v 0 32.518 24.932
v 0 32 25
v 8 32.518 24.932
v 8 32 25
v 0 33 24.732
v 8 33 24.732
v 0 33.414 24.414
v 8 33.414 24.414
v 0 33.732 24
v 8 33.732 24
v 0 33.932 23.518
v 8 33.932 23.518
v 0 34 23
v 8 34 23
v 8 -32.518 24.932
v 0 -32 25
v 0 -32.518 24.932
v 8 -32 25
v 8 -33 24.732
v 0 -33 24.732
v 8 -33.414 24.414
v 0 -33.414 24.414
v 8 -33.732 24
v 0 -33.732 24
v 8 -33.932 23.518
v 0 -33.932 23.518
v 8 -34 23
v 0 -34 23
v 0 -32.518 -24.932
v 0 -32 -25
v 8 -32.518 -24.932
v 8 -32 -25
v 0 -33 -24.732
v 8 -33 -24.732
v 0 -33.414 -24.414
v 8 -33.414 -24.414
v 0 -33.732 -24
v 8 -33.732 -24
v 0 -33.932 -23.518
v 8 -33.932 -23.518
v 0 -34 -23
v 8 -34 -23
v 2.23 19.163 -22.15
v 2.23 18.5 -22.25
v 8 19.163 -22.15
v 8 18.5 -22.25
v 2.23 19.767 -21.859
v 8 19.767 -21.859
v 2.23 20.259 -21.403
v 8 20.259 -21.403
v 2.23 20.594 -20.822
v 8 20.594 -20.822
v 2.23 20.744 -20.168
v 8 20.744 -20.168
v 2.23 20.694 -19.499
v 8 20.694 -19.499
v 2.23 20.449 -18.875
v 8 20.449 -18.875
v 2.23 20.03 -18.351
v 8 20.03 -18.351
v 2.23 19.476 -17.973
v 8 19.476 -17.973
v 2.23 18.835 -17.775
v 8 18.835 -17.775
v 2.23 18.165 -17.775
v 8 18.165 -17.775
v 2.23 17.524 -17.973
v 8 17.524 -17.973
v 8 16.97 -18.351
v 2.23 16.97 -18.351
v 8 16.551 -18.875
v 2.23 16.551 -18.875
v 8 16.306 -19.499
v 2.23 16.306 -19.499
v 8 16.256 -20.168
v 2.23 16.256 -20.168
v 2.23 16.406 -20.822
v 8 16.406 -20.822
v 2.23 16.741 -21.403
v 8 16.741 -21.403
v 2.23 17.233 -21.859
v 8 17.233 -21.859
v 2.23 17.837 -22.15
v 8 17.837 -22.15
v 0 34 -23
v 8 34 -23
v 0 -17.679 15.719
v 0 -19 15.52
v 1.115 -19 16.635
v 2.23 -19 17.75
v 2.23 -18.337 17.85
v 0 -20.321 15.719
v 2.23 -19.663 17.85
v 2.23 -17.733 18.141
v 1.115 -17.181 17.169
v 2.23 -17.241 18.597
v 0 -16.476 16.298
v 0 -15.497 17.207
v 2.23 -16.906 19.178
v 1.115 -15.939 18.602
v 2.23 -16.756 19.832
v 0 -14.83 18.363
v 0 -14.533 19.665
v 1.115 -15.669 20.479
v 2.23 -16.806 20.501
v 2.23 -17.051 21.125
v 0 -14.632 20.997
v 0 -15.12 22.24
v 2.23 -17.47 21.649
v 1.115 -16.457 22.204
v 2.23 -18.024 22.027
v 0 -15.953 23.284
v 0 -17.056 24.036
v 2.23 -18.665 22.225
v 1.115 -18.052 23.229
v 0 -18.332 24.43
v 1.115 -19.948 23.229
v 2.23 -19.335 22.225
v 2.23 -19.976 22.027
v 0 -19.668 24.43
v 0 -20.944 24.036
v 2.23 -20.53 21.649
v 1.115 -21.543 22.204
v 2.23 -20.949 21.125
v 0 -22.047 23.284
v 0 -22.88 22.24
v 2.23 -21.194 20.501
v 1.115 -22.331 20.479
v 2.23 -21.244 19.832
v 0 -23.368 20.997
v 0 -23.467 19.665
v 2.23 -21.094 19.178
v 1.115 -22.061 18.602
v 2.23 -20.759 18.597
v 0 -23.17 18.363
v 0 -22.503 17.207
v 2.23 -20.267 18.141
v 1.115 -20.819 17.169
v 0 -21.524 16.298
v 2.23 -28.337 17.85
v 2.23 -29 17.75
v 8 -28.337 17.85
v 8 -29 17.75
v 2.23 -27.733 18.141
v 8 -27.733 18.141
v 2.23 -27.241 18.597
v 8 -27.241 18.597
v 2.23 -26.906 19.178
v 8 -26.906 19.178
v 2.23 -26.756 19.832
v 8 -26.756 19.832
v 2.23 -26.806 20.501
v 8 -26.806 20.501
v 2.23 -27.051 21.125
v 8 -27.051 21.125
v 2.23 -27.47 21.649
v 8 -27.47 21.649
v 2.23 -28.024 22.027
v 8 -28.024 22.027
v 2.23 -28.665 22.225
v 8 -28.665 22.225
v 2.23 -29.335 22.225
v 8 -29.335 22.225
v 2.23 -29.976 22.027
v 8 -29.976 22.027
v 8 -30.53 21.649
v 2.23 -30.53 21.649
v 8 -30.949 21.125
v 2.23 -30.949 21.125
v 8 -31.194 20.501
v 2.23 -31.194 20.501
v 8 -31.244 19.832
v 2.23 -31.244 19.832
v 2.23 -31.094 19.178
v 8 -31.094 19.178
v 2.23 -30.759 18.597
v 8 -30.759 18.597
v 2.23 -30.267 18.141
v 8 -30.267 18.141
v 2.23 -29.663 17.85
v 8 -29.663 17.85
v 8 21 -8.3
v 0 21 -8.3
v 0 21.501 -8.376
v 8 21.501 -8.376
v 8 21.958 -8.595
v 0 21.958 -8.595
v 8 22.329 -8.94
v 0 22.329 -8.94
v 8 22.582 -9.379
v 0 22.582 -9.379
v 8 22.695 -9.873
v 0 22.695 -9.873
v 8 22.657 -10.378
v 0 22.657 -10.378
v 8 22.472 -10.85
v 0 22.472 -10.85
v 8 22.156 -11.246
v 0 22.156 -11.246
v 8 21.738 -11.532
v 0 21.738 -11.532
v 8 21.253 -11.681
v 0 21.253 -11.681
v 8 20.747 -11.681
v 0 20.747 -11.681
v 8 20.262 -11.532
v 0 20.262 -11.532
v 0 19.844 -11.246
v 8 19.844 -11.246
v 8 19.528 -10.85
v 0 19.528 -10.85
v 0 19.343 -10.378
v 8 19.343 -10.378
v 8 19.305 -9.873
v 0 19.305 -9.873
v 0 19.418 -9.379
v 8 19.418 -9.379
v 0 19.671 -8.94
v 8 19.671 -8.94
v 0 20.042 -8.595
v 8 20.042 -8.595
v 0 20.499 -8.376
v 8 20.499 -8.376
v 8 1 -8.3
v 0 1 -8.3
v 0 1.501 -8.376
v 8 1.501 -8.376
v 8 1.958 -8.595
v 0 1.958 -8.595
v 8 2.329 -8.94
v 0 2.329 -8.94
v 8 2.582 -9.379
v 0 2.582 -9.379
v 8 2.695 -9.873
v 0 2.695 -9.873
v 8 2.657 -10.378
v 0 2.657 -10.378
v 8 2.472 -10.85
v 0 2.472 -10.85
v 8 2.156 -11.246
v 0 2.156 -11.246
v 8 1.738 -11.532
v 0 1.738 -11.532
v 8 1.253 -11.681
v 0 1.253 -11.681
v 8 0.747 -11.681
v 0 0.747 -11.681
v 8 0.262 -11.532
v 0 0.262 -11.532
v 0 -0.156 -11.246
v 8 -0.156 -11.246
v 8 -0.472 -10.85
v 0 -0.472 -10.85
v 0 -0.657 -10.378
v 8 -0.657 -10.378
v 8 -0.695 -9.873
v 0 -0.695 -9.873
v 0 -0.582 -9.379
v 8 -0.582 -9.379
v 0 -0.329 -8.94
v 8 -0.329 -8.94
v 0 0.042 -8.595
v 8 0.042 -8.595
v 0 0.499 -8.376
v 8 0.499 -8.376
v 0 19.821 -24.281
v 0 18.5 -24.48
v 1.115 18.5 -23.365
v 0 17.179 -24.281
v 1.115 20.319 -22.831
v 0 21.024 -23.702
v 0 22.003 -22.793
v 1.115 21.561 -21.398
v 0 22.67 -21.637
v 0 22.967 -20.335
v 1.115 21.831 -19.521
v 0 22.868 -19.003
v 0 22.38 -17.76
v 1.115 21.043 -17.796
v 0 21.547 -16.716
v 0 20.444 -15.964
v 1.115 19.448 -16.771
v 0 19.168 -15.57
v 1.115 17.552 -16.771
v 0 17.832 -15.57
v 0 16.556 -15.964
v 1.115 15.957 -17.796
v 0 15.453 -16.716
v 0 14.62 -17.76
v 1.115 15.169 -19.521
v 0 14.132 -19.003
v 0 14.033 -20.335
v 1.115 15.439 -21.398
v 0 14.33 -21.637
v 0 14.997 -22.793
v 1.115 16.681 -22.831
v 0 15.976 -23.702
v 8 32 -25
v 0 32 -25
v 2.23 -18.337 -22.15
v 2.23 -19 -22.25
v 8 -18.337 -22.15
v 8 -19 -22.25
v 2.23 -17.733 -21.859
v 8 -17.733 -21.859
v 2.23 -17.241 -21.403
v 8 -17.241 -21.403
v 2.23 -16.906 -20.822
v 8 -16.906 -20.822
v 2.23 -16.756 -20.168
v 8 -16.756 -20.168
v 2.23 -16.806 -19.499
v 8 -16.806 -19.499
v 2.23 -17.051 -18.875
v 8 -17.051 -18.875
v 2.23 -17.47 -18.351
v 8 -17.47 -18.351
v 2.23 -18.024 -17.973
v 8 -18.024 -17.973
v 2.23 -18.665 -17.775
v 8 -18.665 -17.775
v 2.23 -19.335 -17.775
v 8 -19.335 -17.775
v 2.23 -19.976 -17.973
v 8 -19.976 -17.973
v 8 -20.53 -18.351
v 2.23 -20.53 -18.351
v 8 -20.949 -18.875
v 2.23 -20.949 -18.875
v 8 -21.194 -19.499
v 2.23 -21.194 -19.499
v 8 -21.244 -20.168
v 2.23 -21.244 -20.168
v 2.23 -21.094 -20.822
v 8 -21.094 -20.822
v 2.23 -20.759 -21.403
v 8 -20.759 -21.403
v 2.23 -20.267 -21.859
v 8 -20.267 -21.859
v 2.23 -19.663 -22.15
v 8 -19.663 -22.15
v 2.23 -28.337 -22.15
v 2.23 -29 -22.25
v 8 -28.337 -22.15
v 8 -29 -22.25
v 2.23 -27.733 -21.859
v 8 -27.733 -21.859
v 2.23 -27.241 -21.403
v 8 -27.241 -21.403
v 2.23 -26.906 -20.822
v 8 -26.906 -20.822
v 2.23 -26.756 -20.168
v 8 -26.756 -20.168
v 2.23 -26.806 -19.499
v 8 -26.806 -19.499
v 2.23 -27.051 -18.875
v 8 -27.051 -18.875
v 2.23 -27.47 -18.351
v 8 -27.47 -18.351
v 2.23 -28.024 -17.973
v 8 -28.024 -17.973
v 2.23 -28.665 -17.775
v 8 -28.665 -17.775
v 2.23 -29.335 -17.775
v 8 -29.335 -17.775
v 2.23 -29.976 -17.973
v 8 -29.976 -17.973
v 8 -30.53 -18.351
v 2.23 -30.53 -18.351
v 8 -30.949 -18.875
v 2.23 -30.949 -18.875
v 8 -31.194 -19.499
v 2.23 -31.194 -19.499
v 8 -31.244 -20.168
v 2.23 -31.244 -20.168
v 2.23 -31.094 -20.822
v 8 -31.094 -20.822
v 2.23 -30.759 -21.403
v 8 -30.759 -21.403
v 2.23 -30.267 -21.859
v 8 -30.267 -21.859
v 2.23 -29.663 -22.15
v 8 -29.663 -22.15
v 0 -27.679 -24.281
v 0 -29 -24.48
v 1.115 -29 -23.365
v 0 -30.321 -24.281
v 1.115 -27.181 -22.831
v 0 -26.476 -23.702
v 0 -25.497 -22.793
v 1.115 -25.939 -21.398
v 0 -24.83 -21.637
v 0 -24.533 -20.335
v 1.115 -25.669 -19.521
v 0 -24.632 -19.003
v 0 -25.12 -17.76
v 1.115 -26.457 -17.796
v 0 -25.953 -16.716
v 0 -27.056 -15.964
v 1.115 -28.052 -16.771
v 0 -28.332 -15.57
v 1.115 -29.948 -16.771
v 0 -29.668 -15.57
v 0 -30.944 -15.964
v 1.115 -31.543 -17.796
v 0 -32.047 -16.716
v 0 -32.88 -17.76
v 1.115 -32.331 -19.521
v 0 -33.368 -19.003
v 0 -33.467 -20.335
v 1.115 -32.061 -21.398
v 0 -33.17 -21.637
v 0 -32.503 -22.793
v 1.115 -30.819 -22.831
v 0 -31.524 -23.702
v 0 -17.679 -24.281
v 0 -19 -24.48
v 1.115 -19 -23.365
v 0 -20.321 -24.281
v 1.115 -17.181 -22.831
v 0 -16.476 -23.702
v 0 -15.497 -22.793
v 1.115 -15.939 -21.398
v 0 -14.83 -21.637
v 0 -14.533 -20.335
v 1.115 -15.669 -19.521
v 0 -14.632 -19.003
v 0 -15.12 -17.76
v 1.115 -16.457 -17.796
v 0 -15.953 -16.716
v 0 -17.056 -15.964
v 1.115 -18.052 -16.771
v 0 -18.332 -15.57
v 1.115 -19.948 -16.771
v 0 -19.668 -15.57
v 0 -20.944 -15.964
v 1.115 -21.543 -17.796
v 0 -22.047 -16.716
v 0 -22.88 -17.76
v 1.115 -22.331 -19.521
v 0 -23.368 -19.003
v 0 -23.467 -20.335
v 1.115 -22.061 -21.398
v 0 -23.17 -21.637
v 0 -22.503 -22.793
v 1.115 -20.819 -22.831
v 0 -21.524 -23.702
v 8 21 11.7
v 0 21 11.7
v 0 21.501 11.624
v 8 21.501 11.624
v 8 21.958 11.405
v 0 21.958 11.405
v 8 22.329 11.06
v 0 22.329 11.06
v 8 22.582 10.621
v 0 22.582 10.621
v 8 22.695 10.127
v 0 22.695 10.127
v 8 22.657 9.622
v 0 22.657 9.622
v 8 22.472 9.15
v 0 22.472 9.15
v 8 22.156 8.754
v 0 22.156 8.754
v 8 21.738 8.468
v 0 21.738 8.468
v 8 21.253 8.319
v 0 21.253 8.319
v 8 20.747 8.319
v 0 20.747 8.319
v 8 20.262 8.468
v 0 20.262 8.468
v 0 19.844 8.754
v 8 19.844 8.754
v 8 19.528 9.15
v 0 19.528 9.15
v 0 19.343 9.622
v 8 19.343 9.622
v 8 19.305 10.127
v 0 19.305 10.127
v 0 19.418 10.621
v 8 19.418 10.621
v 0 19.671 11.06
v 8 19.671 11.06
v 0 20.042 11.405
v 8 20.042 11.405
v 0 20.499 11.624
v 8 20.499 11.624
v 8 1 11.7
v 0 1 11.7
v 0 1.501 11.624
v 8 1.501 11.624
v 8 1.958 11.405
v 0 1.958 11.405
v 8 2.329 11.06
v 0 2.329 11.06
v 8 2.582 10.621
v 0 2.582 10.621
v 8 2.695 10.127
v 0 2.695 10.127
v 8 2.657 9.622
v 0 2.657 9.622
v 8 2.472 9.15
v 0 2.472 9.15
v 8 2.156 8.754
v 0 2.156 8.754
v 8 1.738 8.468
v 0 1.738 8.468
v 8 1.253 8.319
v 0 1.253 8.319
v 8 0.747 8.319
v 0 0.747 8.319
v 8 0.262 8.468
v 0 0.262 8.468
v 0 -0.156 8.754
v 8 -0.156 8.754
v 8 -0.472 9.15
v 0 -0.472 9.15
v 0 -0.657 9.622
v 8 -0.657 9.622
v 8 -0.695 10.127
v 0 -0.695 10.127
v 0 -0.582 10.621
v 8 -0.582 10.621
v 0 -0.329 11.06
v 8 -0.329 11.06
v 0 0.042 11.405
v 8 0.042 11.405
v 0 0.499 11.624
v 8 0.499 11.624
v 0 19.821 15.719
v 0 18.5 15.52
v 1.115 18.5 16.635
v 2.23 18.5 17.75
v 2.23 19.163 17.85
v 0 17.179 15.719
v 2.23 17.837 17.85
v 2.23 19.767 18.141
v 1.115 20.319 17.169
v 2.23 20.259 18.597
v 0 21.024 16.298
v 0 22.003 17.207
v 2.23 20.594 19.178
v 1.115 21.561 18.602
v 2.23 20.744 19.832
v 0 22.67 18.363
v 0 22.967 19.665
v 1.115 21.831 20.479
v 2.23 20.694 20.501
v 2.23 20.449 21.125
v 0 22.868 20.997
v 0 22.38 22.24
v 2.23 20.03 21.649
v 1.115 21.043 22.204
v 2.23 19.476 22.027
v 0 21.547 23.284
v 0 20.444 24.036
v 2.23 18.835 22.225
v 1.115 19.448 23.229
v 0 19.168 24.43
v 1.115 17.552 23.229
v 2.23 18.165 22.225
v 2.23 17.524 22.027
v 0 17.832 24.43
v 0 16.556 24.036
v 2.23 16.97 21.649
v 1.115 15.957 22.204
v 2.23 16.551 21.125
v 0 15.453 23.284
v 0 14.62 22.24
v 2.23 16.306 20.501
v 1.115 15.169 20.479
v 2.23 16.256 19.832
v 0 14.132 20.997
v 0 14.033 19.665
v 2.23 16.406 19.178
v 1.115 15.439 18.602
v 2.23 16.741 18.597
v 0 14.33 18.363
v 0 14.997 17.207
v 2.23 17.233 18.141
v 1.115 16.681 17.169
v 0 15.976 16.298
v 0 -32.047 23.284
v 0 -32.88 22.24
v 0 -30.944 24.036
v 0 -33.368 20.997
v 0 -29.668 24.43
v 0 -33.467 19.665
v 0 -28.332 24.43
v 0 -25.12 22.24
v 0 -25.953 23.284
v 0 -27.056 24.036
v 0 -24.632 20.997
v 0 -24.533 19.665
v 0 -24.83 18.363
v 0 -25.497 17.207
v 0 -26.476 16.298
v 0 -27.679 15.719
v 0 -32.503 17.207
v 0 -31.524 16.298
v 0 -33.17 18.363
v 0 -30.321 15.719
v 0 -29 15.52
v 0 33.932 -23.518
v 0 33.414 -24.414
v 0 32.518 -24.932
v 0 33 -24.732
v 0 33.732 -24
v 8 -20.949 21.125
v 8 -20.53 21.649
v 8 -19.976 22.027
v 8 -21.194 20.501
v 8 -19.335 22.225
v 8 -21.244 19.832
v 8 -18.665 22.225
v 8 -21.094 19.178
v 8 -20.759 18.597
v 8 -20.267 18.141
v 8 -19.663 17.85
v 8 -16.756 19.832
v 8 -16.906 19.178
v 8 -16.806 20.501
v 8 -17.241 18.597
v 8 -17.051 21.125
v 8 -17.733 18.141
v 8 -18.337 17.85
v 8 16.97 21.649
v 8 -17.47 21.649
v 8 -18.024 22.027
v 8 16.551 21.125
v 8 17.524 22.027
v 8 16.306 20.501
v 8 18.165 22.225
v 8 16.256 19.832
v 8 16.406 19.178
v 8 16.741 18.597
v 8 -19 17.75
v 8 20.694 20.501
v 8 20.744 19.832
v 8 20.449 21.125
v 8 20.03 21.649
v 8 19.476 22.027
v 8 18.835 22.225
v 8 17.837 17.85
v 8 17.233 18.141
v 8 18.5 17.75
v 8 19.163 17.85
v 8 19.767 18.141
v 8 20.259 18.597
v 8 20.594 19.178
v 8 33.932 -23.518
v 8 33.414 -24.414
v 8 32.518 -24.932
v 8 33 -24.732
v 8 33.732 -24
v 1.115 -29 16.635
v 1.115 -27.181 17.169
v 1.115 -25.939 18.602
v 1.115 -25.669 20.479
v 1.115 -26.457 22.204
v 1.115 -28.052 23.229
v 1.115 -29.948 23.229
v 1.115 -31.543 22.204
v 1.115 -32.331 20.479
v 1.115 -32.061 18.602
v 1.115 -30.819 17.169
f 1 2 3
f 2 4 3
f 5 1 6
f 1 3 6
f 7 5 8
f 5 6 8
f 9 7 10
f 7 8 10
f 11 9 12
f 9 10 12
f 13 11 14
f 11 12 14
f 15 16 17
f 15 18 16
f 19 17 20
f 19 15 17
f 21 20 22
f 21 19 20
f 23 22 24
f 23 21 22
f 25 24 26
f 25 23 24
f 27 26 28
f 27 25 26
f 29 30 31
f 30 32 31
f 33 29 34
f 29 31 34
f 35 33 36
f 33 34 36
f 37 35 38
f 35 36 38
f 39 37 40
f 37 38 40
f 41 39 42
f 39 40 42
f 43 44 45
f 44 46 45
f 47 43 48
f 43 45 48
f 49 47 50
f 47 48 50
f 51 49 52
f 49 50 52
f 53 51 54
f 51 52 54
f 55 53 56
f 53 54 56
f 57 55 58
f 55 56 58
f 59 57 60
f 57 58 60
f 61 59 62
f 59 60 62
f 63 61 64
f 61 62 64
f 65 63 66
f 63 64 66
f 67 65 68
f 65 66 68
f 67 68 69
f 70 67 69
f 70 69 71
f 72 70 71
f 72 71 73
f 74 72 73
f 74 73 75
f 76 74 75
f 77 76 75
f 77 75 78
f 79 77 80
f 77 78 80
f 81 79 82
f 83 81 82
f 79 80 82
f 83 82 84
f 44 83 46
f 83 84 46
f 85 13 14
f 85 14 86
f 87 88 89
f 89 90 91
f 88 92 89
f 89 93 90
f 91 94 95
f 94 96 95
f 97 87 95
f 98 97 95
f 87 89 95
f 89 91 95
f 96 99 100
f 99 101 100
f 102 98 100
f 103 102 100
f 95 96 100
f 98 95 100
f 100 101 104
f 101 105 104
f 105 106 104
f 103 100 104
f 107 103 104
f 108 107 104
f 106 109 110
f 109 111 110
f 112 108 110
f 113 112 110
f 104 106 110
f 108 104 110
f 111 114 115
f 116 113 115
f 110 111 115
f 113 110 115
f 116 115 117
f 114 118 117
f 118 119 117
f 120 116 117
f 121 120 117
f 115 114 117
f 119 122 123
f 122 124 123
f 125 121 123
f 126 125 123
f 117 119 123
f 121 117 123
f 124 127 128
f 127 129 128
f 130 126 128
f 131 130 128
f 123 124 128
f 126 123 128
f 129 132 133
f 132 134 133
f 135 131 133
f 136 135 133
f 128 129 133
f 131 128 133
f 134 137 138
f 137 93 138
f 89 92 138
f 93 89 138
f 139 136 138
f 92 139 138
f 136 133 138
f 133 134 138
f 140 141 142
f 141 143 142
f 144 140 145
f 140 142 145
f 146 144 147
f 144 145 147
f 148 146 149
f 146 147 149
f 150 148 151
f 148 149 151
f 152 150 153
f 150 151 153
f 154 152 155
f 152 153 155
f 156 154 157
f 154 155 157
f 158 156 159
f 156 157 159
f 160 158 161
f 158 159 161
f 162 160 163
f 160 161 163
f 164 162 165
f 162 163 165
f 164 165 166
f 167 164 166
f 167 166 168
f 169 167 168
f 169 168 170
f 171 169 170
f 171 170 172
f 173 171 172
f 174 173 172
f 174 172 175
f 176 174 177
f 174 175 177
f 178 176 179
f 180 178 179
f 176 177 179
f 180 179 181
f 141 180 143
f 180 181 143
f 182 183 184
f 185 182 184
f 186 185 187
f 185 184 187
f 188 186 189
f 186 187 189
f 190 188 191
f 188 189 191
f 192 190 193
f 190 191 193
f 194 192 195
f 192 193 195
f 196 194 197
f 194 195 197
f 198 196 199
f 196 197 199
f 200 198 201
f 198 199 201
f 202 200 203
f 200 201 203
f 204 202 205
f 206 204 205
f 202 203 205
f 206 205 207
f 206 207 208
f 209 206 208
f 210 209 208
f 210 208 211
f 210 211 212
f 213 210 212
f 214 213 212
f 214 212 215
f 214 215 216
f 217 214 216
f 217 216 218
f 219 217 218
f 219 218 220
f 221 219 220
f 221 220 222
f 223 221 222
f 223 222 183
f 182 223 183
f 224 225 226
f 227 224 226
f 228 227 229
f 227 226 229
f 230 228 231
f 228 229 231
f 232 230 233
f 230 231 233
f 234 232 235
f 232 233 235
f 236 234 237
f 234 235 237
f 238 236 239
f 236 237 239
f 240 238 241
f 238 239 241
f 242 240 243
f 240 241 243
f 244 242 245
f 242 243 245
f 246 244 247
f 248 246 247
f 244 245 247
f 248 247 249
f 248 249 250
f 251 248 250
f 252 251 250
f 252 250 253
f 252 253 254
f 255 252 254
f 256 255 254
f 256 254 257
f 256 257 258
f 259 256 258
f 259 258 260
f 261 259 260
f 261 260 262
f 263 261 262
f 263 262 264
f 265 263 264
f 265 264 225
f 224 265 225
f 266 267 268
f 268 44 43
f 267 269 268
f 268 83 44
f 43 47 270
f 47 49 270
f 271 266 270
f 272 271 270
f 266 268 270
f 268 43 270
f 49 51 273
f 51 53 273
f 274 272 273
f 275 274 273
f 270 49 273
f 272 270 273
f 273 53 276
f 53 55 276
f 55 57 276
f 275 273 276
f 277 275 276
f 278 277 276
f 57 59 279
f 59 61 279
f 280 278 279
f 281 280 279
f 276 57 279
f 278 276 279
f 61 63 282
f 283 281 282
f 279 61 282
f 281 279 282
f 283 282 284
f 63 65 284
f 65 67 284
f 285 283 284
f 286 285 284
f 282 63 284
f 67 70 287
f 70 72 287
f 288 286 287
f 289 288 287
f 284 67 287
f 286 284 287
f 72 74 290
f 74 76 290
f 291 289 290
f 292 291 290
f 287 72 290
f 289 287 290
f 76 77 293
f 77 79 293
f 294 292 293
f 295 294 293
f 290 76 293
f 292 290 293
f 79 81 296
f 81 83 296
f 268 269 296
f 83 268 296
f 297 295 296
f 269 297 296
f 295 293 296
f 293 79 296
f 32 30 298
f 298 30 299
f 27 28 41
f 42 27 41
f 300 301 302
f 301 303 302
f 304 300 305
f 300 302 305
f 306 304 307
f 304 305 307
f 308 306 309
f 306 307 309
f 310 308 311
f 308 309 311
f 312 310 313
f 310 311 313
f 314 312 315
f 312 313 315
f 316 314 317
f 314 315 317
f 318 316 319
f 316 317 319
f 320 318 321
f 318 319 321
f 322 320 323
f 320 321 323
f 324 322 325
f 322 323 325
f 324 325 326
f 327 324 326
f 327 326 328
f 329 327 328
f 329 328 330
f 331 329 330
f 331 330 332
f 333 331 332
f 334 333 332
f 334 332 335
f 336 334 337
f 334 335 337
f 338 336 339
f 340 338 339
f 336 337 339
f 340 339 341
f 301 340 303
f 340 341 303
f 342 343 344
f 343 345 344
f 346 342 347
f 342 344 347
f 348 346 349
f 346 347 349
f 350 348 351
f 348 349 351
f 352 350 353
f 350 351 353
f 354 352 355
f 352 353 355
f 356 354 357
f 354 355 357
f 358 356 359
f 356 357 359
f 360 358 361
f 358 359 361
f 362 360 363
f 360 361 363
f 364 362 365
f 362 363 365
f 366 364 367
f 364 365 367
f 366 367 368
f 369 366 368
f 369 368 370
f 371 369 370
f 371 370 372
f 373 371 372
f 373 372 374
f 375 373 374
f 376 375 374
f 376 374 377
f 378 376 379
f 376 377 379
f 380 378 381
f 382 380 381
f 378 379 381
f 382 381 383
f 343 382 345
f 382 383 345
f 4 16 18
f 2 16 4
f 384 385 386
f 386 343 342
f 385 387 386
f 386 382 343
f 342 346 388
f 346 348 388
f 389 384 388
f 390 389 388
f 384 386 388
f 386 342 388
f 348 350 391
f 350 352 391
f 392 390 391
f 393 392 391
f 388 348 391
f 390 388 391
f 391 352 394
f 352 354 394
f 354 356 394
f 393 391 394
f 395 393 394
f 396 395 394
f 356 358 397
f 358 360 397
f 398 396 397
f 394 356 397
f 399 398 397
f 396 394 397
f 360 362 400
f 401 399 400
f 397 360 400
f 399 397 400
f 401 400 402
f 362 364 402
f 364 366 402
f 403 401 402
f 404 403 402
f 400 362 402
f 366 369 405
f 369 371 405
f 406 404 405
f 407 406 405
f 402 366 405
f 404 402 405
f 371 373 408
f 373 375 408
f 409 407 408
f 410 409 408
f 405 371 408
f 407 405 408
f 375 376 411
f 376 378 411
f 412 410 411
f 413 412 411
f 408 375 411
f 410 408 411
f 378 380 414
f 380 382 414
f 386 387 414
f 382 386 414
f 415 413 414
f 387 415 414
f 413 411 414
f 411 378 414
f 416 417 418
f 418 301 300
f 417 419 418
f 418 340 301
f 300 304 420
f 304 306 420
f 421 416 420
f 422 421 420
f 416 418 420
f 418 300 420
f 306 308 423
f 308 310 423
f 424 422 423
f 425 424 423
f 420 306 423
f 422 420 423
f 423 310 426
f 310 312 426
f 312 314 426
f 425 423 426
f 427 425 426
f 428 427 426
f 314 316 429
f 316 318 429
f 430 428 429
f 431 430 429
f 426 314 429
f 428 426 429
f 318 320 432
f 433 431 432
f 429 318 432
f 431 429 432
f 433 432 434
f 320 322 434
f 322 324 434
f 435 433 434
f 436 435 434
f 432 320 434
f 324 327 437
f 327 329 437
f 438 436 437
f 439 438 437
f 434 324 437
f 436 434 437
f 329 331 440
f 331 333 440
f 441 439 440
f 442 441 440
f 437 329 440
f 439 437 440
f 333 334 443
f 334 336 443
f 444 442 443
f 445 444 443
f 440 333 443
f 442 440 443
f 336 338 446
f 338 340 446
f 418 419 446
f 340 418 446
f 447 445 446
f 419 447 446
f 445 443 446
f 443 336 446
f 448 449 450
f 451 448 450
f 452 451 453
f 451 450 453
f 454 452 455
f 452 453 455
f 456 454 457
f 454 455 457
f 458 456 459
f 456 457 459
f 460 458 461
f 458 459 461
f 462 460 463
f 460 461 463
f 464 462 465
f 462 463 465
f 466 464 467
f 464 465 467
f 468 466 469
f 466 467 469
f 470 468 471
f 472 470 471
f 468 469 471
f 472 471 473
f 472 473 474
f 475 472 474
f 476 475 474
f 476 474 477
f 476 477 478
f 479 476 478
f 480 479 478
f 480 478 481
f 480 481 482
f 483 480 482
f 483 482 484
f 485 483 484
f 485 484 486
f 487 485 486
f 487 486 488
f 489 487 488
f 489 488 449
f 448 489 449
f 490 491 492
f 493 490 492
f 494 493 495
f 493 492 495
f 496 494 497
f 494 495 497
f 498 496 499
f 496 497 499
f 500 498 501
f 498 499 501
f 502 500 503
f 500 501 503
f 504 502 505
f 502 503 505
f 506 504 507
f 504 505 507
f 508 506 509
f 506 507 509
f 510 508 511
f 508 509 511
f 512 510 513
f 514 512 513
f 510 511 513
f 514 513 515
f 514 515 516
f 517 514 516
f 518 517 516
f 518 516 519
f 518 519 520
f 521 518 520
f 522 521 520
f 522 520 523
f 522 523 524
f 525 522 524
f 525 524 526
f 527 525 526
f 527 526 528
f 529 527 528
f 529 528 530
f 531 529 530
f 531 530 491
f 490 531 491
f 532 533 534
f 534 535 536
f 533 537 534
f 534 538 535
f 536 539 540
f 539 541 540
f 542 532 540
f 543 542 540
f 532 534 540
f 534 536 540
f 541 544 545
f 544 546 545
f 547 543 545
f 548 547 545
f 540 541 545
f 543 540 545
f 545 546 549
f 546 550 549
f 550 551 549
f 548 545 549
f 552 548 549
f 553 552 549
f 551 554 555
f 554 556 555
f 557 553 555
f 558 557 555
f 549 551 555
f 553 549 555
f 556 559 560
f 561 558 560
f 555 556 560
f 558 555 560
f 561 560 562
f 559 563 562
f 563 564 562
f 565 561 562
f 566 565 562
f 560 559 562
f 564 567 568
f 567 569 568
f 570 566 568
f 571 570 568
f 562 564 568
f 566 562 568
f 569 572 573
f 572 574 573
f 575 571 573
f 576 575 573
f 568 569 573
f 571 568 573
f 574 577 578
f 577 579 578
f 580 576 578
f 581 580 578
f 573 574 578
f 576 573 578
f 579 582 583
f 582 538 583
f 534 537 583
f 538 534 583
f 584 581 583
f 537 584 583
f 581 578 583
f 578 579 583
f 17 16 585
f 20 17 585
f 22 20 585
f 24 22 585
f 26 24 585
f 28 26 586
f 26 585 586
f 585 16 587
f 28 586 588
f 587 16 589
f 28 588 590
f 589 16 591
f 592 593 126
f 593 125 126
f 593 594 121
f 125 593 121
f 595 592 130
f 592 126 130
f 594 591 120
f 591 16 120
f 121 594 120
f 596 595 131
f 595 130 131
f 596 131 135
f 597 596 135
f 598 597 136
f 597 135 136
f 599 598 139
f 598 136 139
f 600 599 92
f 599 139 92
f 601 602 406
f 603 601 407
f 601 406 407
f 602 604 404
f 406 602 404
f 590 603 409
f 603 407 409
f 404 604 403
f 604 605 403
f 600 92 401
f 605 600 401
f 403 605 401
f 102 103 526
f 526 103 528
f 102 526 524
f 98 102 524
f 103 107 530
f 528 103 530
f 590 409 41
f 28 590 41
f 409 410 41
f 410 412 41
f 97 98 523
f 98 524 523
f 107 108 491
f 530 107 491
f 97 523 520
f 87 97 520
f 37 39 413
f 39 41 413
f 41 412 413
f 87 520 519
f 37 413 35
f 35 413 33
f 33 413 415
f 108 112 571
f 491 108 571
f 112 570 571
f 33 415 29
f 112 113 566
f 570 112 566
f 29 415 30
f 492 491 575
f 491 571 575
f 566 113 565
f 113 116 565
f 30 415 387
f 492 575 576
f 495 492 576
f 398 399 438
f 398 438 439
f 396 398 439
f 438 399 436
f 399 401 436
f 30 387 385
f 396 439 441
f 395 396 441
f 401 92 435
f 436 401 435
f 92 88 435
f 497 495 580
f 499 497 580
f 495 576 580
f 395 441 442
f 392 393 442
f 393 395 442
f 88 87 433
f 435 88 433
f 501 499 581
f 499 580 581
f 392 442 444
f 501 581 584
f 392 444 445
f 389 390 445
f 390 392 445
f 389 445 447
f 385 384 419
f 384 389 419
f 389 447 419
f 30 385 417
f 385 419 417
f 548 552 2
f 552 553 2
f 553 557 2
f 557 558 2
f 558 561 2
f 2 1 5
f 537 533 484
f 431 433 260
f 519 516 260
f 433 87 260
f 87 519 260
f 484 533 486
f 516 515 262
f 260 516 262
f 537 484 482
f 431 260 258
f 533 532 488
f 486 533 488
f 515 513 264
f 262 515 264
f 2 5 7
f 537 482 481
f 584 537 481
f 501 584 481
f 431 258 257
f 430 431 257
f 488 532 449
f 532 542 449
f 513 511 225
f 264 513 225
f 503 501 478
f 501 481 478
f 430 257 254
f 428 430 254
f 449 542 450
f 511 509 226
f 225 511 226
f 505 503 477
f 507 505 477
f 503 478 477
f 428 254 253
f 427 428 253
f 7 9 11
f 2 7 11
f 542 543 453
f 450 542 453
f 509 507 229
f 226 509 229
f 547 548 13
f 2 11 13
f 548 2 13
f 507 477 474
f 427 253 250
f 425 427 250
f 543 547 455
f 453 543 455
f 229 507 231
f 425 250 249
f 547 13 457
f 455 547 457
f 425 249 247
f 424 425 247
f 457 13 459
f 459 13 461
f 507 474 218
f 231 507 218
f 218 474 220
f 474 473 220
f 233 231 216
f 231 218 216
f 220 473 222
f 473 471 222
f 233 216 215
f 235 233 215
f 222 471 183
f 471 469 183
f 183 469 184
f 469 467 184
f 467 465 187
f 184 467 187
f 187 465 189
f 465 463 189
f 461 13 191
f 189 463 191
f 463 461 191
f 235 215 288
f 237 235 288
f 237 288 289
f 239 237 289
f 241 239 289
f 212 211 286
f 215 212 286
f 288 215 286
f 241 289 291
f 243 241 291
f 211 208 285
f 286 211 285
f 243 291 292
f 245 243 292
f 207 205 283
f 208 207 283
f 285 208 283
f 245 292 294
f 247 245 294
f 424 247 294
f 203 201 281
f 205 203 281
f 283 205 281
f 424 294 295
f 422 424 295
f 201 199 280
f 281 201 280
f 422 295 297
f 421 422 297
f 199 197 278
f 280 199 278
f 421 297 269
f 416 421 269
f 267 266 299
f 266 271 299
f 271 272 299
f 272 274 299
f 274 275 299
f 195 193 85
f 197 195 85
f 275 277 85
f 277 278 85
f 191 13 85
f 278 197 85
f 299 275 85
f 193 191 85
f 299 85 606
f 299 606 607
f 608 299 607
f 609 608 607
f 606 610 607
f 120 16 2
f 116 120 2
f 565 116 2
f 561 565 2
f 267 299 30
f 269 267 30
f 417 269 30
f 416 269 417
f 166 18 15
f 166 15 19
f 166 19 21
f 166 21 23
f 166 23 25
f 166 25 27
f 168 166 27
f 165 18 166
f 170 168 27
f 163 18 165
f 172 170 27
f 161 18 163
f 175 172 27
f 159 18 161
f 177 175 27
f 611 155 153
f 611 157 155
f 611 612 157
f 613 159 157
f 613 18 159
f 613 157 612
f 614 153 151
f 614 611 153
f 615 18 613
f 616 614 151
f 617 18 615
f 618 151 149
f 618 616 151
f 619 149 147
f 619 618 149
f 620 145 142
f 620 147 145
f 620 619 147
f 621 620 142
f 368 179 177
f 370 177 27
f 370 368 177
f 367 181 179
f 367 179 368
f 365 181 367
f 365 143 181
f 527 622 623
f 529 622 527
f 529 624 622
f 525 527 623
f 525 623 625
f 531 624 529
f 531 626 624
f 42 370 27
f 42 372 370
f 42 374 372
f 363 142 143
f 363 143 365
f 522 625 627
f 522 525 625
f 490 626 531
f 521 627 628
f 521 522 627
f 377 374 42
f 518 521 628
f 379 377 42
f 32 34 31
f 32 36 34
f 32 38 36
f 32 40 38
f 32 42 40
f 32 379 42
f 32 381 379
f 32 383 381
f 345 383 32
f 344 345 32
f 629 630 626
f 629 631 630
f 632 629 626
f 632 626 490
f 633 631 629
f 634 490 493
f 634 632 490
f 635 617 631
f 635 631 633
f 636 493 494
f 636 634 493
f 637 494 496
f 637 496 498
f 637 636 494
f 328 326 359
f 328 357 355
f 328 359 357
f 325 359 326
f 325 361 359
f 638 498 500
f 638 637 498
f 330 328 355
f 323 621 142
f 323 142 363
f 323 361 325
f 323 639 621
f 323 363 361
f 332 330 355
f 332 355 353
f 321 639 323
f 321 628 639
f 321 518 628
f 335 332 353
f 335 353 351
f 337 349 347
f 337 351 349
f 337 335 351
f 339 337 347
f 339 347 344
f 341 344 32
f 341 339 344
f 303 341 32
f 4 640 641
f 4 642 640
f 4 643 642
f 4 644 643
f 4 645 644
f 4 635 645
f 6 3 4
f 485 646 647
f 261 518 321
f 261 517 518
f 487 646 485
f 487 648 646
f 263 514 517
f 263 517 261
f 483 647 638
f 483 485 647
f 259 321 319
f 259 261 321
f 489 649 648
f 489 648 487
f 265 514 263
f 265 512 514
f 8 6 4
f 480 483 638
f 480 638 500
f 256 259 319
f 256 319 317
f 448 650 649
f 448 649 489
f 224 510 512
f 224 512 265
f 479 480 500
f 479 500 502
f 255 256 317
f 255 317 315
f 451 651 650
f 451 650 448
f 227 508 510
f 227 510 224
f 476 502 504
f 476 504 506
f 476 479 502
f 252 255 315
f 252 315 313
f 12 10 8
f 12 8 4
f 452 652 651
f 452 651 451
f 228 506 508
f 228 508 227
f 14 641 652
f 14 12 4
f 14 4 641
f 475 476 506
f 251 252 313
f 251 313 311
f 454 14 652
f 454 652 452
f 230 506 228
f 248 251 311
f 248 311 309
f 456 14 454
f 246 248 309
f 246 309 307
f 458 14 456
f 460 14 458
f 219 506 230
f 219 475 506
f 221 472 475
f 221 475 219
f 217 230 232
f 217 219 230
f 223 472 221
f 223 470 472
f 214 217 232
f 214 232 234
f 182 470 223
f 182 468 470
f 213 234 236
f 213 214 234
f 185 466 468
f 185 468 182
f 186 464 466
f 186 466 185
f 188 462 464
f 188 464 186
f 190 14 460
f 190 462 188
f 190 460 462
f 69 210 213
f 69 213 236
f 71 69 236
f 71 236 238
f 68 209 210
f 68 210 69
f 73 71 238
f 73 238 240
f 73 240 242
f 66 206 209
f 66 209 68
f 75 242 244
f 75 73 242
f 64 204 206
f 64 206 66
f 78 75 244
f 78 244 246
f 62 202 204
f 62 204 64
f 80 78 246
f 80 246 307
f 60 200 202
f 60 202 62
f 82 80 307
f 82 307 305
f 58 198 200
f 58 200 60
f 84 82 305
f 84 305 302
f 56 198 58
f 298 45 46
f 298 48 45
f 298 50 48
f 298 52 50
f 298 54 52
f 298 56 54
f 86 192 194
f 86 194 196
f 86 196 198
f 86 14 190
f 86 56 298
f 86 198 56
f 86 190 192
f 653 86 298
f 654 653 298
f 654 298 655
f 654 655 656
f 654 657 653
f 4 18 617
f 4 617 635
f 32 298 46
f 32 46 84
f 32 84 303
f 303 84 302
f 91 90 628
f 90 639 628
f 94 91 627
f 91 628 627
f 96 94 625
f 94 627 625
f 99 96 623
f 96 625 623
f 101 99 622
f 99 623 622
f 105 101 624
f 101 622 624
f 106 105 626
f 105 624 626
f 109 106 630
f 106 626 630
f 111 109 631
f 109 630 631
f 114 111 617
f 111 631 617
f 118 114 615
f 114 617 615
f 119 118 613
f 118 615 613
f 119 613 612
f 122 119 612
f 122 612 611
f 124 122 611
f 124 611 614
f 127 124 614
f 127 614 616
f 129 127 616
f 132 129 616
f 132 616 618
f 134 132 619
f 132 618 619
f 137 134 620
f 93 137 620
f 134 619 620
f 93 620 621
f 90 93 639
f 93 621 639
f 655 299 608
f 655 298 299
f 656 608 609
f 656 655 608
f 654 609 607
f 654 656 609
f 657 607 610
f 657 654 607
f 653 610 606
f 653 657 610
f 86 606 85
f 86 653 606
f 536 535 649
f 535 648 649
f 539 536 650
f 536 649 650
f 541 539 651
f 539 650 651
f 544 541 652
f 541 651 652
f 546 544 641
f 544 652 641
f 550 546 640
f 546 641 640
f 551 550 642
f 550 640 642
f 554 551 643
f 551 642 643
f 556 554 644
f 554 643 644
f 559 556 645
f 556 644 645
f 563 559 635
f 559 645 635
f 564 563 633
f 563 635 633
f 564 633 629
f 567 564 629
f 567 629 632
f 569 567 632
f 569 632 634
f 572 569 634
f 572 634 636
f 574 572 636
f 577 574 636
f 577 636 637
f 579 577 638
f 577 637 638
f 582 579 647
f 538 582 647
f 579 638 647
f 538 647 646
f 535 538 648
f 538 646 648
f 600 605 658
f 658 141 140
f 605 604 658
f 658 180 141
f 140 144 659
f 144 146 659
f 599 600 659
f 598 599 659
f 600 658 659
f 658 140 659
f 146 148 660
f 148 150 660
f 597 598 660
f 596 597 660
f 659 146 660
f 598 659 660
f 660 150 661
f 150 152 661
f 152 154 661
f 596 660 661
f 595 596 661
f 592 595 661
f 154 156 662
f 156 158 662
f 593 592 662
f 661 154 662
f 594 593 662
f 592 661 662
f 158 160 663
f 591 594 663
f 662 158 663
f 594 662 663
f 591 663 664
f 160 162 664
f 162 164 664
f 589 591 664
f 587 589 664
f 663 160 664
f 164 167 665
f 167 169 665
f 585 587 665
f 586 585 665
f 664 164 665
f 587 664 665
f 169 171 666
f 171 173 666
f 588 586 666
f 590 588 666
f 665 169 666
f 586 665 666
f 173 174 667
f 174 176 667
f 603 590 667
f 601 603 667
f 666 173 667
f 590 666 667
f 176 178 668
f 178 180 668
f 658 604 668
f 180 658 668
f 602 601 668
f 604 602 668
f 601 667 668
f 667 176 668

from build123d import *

# Parameters (mm, degrees)
SKETCH1_W                                            = 50
SKETCH1_H                                            = 68
BOSS_EXTRUDE1_DEPTH                                  = 8
M3_CLEARANCE_HOLE1_D                                 = 3.4
CSK_FOR_M4_HEX_SOCKET_COUNTERSUNK_CAP_SC_D           = 4.5
CSK_FOR_M4_HEX_SOCKET_COUNTERSUNK_CAP_SC_CSINK_D     = 8.96
CSK_FOR_M4_HEX_SOCKET_COUNTERSUNK_CAP_SC_CSINK_ANGLE = 90
FILLET1_R                                            = 2
CSK_FOR_M4_HEX_SOCKET_COUNTERSUNK_CA_2_D             = 4.5
CSK_FOR_M4_HEX_SOCKET_COUNTERSUNK_CA_2_CSINK_D       = 8.96
CSK_FOR_M4_HEX_SOCKET_COUNTERSUNK_CA_2_CSINK_ANGLE   = 90


with BuildPart() as part:
    # Sketch1 → Boss-Extrude1 (new body)
    with BuildSketch(Plane(origin=(0, 0, 0), x_dir=(0, 0, -1), z_dir=(1, 0, 0))):
        Rectangle(SKETCH1_W, SKETCH1_H)
    extrude(amount=BOSS_EXTRUDE1_DEPTH)

    # M3 Clearance Hole1 (through all)
    with Locations(Plane(origin=(8, 0, 0), x_dir=(0, 0, -1), z_dir=(1, 0, 0))):
        with Locations((-10, 21), (10, 21), (10, 1), (-10, 1)):
            Hole(M3_CLEARANCE_HOLE1_D / 2)

    # CSK for M4 Hex Socket Countersunk Cap Sc (through all)
    with Locations(Plane.ZY):
        with Locations((-20, -29), (20, -29)):
            CounterSinkHole(CSK_FOR_M4_HEX_SOCKET_COUNTERSUNK_CAP_SC_D / 2, CSK_FOR_M4_HEX_SOCKET_COUNTERSUNK_CAP_SC_CSINK_D / 2, counter_sink_angle=CSK_FOR_M4_HEX_SOCKET_COUNTERSUNK_CAP_SC_CSINK_ANGLE)

    # Fillet1
    fillet1_edges = [part.edges().sort_by_distance(p)[0] for p in [
        (4, -34, -25),
        (4, -34, 25),
        (4, 34, 25),
        (4, 34, -25),
    ]]
    fillet(fillet1_edges, radius=FILLET1_R)

    # CSK for M4 Hex Socket Countersunk Ca 2 (through all)
    with Locations(Plane.ZY):
        with Locations((20, -19), (20, 18.5), (-20, 18.5), (-20, -19)):
            CounterSinkHole(CSK_FOR_M4_HEX_SOCKET_COUNTERSUNK_CA_2_D / 2, CSK_FOR_M4_HEX_SOCKET_COUNTERSUNK_CA_2_CSINK_D / 2, counter_sink_angle=CSK_FOR_M4_HEX_SOCKET_COUNTERSUNK_CA_2_CSINK_ANGLE)


solid = part.part
